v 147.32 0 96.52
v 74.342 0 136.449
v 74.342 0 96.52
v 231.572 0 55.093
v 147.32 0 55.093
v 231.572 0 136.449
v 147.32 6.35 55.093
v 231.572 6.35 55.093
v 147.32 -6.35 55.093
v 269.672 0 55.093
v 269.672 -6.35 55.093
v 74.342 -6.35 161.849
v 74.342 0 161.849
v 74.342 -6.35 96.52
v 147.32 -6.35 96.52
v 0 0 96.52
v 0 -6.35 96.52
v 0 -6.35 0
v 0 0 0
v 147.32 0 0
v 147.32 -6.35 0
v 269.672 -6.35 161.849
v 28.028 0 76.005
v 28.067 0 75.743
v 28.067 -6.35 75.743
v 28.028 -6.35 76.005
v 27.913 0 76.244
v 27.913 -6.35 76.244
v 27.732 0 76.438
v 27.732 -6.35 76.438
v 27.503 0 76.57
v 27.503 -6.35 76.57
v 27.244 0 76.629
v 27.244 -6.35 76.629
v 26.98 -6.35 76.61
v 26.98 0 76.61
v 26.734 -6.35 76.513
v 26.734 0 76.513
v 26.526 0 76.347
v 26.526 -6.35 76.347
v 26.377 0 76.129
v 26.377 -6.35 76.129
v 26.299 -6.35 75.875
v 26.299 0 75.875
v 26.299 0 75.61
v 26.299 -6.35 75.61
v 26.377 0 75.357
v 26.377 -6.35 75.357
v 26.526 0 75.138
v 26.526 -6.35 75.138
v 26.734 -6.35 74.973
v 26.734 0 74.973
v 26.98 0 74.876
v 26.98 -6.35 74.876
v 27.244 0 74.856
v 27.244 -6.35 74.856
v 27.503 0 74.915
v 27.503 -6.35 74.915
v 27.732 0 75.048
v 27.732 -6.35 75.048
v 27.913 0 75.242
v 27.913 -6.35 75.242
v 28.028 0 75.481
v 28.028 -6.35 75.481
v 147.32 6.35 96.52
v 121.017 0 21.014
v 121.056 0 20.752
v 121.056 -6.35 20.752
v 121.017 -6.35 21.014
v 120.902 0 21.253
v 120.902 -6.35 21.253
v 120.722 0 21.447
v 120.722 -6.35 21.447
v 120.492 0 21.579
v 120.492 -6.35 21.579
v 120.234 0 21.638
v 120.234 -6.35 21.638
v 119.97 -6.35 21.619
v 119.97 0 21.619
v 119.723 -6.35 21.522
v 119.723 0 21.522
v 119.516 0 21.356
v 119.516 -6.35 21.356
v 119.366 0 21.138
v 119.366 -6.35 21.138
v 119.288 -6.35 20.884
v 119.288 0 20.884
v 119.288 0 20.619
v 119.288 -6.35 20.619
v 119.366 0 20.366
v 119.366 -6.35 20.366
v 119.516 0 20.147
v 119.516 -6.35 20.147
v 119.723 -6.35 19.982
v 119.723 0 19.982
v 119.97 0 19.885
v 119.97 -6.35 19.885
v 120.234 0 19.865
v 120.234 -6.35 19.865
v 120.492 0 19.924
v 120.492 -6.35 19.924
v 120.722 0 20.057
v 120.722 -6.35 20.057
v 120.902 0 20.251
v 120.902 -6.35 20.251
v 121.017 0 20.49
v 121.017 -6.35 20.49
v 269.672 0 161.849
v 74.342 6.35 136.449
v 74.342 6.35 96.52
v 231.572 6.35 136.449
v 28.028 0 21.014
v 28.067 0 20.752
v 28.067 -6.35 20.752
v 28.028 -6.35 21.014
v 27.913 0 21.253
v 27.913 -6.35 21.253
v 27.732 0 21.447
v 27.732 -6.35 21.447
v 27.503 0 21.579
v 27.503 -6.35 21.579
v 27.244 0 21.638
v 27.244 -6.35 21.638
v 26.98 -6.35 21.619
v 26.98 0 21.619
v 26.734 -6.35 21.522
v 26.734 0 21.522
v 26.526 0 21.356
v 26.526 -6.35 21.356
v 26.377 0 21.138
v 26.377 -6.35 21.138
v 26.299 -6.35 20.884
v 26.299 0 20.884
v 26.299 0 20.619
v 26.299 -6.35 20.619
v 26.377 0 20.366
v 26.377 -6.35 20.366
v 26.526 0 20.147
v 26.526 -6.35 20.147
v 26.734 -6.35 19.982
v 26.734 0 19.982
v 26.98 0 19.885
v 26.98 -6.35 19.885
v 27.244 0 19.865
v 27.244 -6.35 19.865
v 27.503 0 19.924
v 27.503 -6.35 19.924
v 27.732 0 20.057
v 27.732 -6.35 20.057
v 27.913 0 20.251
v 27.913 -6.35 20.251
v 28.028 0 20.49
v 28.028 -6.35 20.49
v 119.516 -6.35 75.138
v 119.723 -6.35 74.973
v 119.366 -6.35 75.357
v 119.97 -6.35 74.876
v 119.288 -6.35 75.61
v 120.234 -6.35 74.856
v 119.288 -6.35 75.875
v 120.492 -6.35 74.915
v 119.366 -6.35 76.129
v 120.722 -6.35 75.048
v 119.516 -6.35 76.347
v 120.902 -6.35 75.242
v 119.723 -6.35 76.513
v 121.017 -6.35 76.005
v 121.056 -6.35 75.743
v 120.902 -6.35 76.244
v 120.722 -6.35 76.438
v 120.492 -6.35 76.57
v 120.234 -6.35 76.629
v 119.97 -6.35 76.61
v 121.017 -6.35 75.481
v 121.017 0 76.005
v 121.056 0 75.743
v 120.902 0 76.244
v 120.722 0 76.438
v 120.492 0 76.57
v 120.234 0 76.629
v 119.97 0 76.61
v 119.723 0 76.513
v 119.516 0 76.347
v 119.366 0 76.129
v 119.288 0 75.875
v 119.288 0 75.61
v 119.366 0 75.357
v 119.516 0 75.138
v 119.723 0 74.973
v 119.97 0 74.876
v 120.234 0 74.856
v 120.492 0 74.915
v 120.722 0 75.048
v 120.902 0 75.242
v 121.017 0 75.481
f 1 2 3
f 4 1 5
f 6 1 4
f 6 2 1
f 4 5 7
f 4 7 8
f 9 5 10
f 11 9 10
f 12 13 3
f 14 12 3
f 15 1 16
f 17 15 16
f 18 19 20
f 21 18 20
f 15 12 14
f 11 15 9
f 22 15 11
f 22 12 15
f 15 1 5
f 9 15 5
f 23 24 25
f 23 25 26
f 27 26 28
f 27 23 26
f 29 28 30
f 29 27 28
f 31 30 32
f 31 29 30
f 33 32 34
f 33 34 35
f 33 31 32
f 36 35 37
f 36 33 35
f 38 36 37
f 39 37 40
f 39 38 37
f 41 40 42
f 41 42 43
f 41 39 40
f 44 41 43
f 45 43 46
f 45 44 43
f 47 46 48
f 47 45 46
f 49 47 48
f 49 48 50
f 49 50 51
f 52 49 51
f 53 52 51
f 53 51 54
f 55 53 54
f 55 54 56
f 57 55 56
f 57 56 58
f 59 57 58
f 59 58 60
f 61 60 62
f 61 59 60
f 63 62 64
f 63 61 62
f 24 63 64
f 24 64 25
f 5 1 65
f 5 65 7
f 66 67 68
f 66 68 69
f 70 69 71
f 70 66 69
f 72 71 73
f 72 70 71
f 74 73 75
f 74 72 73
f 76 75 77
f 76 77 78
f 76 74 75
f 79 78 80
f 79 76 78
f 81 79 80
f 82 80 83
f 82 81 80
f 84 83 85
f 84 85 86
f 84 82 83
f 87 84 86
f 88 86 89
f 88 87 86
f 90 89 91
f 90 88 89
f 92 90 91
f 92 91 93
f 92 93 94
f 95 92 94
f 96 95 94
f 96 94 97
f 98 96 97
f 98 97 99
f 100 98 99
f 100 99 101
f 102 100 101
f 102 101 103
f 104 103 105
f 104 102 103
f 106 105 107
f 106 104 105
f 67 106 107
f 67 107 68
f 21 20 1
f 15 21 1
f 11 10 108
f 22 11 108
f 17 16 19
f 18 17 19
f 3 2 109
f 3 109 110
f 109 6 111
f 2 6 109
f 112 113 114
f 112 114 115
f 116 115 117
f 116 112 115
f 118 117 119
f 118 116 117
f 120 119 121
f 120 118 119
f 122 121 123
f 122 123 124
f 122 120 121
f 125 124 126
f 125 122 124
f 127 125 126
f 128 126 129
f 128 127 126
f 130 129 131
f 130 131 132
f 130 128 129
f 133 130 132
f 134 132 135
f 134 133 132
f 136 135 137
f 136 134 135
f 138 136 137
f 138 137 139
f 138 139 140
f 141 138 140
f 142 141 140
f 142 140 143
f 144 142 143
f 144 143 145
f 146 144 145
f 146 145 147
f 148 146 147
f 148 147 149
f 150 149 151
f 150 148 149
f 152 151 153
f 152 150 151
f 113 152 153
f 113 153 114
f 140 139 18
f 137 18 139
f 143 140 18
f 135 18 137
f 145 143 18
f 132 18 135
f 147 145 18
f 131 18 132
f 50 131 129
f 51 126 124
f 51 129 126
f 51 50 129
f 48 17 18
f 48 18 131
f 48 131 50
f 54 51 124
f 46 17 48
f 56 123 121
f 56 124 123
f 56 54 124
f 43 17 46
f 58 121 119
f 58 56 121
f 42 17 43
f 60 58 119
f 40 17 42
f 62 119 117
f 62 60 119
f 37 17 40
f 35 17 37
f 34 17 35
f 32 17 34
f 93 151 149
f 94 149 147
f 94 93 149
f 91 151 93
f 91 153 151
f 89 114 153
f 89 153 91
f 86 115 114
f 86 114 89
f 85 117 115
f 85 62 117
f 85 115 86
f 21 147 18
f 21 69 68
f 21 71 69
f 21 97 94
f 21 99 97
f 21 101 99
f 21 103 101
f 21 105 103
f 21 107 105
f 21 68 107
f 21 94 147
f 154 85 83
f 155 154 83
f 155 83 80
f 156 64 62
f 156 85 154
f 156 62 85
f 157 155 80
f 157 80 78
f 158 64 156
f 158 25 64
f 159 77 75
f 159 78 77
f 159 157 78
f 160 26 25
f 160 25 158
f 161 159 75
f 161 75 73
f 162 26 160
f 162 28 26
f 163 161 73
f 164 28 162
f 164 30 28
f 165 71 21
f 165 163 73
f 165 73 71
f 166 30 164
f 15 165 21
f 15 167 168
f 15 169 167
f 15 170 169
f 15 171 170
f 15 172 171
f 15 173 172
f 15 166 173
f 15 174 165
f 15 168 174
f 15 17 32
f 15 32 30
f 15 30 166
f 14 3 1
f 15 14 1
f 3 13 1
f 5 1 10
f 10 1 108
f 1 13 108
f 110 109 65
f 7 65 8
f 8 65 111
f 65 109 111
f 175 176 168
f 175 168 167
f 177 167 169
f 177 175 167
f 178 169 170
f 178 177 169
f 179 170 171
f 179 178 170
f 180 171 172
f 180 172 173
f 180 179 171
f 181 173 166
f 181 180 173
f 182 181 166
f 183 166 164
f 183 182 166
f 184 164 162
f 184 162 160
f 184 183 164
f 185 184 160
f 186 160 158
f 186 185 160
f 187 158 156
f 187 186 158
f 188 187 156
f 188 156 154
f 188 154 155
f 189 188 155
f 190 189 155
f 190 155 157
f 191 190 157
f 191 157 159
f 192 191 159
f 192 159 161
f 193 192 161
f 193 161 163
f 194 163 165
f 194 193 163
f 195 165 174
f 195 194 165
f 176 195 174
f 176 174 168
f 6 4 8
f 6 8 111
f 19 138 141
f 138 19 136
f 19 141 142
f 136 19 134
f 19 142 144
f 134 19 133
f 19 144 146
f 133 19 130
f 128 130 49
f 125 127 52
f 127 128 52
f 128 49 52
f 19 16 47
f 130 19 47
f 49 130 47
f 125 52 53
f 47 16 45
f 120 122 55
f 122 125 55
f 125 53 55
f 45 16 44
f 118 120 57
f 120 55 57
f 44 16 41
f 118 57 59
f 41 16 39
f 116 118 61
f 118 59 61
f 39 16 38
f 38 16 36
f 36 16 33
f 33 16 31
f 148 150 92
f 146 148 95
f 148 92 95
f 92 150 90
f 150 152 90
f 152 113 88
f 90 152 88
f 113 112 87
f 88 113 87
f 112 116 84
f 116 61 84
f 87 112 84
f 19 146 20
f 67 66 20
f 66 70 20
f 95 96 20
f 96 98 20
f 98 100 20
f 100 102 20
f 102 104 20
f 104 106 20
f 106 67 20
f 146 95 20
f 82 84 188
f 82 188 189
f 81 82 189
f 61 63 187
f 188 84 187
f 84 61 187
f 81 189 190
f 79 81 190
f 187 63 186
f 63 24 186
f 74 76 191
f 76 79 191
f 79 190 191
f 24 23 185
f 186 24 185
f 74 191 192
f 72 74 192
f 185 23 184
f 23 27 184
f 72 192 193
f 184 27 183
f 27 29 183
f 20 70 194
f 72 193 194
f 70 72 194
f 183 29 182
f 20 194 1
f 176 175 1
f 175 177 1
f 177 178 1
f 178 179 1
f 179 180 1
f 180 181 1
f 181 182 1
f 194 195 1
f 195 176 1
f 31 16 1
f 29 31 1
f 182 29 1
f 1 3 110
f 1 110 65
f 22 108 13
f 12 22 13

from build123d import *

# Parameters (mm, degrees)
F0_R     = 0.889
F1_DEPTH = 6.35
F3_DEPTH = 6.35
F4_DEPTH = 6.35


with BuildPart() as f1:
    # F0 (on Front) → F1 (new body)
    with BuildSketch(Plane.XZ):
        Polygon((0, 48.26), (0, 0), (147.32, 0), (147.32, 96.52), (0, 96.52), align=None)
        with Locations((27.178, 20.7518)):
            Circle(F0_R, mode=Mode.SUBTRACT)
        with Locations((120.1674, 20.7518)):
            Circle(F0_R, mode=Mode.SUBTRACT)
        with Locations((27.178, 75.7428)):
            Circle(F0_R, mode=Mode.SUBTRACT)
        with Locations((120.1674, 75.7428)):
            Circle(F0_R, mode=Mode.SUBTRACT)
    extrude(amount=F1_DEPTH)


with BuildPart() as f3:
    # F2 (on Front) → F3 (new body)
    with BuildSketch(Plane.XZ):
        Polygon((74.342263, 136.4488), (74.342263, 96.52), (147.32, 96.52), (147.32, 55.0926), (231.5718, 55.0926), (231.5718, 136.4488), align=None)
        Polygon((74.342263, 161.8488), (74.342263, 136.4488), (231.5718, 136.4488), (231.5718, 55.0926), (269.6718, 55.0926), (269.6718, 161.8488), align=None)
    extrude(amount=F3_DEPTH)


with BuildPart() as f4:
    # F2 (on Front) → F4 (new body)
    with BuildSketch(Plane.XZ):
        Polygon((74.342263, 136.4488), (74.342263, 96.52), (147.32, 96.52), (147.32, 55.0926), (231.5718, 55.0926), (231.5718, 136.4488), align=None)
    extrude(amount=-F4_DEPTH)


solid = Compound([f1.part, f3.part, f4.part])
